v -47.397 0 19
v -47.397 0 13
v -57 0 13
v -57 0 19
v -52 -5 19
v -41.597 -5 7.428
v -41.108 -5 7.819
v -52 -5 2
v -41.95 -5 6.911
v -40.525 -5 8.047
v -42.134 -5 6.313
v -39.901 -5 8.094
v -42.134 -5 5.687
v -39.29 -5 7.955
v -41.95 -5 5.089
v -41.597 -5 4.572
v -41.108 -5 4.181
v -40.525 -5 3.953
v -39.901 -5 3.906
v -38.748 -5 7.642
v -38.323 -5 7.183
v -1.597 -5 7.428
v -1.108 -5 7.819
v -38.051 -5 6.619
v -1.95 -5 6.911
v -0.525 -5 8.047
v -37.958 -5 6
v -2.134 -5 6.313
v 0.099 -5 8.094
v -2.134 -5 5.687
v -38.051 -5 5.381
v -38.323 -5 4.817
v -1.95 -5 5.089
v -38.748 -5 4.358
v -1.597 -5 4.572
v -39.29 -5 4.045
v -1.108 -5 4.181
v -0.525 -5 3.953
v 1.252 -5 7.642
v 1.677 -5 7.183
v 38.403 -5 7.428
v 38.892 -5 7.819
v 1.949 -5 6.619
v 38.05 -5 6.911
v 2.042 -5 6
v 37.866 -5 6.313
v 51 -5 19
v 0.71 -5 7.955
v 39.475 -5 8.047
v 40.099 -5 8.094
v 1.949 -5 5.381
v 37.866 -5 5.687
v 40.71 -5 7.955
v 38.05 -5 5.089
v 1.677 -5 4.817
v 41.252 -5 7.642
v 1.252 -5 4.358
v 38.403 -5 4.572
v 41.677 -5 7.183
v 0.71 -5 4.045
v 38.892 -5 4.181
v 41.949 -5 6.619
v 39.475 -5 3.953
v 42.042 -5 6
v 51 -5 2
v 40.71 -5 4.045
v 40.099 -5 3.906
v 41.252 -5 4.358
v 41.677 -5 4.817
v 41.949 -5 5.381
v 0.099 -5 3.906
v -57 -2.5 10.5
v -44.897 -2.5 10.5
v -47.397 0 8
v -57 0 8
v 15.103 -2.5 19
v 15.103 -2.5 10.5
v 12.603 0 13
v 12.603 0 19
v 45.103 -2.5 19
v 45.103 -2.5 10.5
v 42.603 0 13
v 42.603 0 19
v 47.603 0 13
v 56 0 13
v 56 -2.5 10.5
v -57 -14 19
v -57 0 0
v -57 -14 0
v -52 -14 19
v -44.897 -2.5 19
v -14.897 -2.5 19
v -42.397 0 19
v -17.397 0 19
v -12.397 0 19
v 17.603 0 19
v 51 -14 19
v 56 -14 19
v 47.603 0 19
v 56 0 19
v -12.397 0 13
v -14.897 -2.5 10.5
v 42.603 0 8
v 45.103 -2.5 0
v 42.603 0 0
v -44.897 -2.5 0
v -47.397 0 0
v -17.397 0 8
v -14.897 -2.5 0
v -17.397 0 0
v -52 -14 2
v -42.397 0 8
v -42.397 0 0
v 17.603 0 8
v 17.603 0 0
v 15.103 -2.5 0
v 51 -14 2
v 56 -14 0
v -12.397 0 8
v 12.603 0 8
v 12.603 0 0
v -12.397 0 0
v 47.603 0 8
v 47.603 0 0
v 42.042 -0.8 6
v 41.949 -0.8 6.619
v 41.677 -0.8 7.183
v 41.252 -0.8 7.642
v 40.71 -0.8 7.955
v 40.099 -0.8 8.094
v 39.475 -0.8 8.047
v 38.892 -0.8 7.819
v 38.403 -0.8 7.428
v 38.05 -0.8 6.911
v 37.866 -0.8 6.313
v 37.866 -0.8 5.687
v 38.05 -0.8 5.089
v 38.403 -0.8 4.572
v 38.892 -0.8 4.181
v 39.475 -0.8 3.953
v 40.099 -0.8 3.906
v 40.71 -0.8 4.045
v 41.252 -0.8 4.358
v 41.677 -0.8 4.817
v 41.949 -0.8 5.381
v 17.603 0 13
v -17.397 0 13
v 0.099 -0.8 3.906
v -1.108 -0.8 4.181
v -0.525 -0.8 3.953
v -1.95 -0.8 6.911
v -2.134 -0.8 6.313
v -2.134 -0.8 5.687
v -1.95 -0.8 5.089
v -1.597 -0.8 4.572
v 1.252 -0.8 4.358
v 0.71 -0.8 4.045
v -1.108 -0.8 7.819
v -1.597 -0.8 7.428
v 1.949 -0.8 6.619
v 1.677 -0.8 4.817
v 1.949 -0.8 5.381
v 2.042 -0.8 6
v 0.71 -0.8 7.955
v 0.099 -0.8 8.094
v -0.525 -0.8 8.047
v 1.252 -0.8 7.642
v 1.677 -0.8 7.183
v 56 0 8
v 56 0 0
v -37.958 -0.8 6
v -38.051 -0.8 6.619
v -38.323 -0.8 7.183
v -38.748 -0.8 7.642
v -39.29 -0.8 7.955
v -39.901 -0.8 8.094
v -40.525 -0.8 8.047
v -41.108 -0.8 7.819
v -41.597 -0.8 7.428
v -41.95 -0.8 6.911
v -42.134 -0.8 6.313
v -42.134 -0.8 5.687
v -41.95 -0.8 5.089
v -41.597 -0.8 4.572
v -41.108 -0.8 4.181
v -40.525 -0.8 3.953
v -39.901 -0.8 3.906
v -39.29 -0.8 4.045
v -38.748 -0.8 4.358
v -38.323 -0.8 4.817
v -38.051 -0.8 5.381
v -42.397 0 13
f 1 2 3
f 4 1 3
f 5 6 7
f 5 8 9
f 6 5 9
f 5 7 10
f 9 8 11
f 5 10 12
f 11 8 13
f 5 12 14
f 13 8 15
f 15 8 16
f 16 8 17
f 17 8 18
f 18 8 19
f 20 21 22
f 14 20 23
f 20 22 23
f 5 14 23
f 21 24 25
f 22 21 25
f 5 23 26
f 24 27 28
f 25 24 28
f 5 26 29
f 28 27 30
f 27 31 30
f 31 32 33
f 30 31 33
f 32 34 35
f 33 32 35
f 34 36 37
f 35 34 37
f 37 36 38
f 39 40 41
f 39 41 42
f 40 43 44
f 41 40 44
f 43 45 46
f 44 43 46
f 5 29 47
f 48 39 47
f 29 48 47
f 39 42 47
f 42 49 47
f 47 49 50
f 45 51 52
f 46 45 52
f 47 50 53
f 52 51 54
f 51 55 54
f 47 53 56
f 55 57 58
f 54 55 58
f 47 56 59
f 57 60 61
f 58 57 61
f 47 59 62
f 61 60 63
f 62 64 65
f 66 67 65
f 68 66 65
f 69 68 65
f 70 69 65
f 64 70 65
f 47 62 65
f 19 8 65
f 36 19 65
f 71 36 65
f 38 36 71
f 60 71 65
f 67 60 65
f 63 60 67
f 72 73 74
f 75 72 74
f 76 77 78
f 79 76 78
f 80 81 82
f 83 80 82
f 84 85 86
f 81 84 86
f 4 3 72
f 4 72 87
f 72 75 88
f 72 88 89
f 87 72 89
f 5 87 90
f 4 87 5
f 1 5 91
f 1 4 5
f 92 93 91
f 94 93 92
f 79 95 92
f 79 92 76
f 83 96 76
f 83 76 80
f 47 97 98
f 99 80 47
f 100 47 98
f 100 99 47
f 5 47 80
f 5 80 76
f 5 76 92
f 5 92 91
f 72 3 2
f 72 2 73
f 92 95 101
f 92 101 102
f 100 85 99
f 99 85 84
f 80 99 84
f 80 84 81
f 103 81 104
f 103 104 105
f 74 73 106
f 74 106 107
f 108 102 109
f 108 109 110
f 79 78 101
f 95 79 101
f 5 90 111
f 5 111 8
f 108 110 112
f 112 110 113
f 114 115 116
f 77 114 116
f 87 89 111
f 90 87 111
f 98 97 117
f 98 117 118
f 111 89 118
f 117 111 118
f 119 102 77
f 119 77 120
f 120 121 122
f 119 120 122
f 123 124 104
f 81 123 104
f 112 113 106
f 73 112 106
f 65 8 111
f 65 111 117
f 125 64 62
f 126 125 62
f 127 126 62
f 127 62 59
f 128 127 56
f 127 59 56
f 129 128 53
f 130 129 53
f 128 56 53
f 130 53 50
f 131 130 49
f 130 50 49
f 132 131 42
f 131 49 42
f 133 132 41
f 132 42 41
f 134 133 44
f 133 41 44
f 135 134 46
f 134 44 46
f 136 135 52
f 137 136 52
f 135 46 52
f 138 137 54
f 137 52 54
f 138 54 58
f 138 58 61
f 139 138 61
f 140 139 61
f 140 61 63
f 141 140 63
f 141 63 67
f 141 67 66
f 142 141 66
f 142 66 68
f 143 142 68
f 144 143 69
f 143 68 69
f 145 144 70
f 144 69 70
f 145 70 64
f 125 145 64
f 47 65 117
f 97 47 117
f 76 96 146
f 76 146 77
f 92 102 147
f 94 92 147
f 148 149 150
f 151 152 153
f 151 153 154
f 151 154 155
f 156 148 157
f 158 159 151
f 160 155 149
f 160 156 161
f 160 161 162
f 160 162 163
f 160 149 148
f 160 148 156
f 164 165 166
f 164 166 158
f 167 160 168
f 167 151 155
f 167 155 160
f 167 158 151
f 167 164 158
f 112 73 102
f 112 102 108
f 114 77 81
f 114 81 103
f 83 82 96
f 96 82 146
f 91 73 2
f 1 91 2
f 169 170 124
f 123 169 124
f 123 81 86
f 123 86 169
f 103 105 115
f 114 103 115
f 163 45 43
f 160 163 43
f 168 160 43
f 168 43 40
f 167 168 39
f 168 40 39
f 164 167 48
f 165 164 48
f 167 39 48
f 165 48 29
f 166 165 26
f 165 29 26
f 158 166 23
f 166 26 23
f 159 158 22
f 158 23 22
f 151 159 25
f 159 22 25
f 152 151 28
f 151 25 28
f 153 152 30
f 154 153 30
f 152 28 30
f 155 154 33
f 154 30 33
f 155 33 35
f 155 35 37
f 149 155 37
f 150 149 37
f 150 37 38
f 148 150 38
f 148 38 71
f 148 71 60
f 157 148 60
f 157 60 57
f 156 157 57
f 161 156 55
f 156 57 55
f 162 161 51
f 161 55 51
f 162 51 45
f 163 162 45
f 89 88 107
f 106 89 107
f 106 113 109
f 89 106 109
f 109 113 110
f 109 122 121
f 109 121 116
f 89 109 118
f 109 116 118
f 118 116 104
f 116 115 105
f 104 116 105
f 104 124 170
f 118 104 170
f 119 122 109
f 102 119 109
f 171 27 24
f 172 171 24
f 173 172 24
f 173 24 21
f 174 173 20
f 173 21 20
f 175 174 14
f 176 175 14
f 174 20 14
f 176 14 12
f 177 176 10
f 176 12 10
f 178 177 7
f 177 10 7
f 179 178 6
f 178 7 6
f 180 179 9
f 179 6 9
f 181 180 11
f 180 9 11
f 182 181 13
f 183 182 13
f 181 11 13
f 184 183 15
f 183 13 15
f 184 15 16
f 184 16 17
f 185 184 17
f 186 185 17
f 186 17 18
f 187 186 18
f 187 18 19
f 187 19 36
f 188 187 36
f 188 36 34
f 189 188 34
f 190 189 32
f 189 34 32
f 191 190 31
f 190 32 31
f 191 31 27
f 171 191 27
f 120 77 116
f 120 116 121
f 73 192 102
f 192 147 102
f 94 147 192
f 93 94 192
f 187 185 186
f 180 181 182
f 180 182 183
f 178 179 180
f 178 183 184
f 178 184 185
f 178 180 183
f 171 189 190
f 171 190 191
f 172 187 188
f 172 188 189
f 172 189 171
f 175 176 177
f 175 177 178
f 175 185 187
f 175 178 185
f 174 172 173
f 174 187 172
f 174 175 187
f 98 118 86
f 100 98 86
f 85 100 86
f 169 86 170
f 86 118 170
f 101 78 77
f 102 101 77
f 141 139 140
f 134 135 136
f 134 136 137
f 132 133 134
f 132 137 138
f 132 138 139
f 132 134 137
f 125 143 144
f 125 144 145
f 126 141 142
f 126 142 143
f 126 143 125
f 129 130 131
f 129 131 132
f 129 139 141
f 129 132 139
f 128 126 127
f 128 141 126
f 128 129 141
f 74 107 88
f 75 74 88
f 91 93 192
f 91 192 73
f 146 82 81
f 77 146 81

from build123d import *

# Parameters (mm, degrees)
F1_DEPTH = 19
F0_W     = 103
F0_H     = 9
F2_DEPTH = 2
F4_DEPTH = 120
F5_R     = 2.1
F6_DEPTH = 4.2


with BuildPart() as f1:
    # F0 (on Top) → F1 (new body)
    with BuildSketch(Plane.XY):
        Polygon((-52, -14), (-52, -5), (51, -5), (51, -14), (56, -14), (56, 0), (47.60337, 0), (45.10337, -2.5), (42.60337, 0), (17.60337, 0), (15.10337, -2.5), (12.60337, 0), (-12.39663, 0), (-14.89663, -2.5), (-17.39663, 0), (-42.39663, 0), (-44.89663, -2.5), (-47.39663, 0), (-57, 0), (-57, -14), align=None)
    extrude(amount=F1_DEPTH)

    # F0 (on Top) → F2 (join)
    with BuildSketch(Plane.XY):
        with Locations((-0.5, -9.5)):
            Rectangle(F0_W, F0_H)
    extrude(amount=F2_DEPTH)

    # F3 (on face) → F4 (cut)
    with BuildSketch(Plane.YZ.offset(56)):
        Polygon((0, 8), (0, 13), (-2.5, 10.5), align=None)
        Polygon((1.035534, 6.964466), (1.035534, 14.035534), (0, 13), (0, 8), align=None)
    extrude(amount=-F4_DEPTH, mode=Mode.SUBTRACT)

    # F5 (on face) → F6 (cut)
    with BuildSketch(Plane.XZ.offset(5)):
        with Locations((-40.057622, 6)):
            Circle(F5_R)
        with Locations((-0.057622, 6)):
            Circle(F5_R)
        with Locations((39.942378, 6)):
            Circle(F5_R)
    extrude(amount=-F6_DEPTH, mode=Mode.SUBTRACT)


solid = f1.part
